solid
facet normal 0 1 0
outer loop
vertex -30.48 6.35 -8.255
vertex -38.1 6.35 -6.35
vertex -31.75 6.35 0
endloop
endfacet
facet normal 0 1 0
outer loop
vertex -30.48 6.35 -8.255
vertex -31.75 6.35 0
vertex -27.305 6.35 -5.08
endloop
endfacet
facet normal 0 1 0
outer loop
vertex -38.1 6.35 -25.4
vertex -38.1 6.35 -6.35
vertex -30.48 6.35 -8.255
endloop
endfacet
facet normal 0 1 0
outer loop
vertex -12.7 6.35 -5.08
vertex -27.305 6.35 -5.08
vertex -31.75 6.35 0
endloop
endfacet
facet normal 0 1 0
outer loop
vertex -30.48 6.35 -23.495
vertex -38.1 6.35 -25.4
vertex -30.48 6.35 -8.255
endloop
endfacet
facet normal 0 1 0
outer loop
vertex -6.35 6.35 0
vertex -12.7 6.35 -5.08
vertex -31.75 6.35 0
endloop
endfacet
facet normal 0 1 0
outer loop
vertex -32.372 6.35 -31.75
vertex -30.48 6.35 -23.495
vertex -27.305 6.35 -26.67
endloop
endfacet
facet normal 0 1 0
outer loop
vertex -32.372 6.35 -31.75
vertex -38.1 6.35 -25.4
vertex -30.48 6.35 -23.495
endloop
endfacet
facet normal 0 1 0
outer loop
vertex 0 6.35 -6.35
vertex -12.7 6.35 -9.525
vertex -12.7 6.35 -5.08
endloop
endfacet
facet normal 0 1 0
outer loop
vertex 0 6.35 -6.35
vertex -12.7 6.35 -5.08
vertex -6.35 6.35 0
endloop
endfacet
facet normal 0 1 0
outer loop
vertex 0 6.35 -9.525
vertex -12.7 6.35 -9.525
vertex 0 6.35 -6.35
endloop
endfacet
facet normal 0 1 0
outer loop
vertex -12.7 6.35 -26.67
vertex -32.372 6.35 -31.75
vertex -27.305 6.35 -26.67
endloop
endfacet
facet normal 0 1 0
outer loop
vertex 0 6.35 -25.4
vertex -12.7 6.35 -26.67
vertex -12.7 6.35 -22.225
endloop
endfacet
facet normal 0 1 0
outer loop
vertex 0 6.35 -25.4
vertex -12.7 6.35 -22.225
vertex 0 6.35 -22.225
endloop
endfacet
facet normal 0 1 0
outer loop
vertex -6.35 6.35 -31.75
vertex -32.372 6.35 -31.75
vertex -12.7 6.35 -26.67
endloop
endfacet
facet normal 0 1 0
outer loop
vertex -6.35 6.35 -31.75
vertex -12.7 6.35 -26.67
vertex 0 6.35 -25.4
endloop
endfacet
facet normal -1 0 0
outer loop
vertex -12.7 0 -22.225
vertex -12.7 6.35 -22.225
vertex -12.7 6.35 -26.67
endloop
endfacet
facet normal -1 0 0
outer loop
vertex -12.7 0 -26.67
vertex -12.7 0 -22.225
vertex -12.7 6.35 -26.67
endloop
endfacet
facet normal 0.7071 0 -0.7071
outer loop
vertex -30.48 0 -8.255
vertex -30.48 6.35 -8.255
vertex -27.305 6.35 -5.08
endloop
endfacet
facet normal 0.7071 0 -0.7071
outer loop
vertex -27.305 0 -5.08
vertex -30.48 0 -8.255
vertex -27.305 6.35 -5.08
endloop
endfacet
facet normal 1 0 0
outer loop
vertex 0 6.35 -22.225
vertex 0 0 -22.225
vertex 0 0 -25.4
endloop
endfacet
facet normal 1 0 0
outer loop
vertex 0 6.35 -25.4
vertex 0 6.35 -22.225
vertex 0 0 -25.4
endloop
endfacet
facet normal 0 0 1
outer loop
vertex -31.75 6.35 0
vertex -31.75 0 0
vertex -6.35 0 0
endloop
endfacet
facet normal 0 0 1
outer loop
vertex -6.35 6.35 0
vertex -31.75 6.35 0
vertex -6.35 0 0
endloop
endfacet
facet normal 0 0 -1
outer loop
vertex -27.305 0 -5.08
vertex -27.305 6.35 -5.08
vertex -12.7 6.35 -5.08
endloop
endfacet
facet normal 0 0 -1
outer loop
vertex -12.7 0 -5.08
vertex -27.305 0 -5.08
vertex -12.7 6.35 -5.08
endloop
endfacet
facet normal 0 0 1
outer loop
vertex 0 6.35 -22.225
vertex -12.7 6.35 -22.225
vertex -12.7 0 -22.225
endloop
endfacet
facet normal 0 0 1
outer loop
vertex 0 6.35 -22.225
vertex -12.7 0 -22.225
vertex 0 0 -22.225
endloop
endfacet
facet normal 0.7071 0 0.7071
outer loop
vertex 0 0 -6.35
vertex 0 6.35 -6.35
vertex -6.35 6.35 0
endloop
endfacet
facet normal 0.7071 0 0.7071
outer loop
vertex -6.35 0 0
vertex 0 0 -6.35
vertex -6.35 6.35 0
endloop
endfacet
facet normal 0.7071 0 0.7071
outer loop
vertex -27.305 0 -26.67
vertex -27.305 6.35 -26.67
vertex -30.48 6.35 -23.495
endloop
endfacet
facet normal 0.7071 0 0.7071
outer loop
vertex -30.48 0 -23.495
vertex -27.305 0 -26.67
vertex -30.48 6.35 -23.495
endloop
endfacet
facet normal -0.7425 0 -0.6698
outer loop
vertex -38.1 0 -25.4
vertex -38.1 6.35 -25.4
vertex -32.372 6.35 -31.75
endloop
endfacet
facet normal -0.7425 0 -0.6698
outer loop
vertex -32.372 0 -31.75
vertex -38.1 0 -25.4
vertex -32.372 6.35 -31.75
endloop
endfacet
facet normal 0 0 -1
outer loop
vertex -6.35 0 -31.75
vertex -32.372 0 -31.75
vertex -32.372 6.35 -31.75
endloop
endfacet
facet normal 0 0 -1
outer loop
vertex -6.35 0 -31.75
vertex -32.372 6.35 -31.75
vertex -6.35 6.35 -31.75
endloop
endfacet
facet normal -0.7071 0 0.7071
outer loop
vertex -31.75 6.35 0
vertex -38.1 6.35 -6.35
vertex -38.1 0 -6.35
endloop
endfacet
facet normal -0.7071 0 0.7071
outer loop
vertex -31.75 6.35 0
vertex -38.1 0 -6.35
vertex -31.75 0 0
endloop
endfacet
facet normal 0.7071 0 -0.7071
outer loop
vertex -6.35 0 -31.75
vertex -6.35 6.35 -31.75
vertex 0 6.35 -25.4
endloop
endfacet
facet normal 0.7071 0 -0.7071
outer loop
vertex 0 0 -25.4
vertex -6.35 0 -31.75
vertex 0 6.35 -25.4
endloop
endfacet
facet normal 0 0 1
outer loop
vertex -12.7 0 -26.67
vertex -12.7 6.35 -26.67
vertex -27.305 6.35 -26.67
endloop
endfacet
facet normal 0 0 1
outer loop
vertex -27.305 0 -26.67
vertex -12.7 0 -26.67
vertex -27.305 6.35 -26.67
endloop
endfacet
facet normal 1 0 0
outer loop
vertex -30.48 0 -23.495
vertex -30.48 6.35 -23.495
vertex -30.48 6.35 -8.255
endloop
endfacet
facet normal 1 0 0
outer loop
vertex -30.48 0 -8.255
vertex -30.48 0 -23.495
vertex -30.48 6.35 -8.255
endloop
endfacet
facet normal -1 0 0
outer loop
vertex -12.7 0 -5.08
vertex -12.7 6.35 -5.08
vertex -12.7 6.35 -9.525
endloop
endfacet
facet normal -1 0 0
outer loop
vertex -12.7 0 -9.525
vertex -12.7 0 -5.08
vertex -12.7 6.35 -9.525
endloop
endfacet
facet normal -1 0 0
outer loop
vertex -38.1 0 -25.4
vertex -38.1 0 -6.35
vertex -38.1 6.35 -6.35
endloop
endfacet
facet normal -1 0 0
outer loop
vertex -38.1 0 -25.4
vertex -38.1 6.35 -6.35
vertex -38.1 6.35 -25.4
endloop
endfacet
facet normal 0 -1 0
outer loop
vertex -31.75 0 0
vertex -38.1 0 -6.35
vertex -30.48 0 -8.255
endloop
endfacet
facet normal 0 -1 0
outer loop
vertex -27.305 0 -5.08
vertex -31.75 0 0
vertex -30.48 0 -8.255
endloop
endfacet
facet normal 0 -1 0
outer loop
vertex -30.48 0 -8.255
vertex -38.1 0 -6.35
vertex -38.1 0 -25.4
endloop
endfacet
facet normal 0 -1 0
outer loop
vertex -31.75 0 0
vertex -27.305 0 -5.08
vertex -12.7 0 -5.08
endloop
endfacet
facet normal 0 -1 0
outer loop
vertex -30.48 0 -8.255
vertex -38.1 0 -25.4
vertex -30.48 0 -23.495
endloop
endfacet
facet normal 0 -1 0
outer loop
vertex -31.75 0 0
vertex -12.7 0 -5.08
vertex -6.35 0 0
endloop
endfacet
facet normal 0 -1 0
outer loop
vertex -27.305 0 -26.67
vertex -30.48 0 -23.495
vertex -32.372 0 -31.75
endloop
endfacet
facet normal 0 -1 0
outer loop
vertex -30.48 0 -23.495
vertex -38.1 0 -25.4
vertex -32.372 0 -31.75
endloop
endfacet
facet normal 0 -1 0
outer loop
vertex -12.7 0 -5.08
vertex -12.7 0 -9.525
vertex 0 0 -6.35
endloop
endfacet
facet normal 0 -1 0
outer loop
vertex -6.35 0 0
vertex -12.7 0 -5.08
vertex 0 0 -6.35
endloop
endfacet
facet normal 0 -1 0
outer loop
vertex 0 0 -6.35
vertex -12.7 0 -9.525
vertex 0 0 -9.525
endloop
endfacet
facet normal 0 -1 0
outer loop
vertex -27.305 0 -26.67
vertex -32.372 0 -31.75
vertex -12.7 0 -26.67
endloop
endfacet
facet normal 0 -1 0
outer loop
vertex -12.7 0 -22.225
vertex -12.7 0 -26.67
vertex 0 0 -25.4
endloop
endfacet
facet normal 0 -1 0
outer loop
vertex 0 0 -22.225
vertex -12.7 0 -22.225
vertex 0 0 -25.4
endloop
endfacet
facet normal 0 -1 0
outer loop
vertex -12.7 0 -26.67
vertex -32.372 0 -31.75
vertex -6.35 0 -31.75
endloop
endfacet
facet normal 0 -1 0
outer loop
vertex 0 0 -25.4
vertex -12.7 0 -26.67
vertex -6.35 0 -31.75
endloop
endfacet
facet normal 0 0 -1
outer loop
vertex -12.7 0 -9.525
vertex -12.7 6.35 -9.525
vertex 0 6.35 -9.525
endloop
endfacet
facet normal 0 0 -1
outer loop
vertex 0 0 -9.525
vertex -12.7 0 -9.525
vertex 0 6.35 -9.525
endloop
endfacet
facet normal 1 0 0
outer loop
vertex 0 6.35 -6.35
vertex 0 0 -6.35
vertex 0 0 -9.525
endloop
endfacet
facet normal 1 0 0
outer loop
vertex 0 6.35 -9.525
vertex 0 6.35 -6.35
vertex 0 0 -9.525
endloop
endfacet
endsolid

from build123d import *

# Parameters (mm, degrees)
SKETCH1_W           = 38.1
SKETCH1_H           = 31.75
BOSS_EXTRUDE1_DEPTH = 6.35
SKETCH2_W           = 12.7
SKETCH2_H           = 12.7
CUT_EXTRUDE1_DEPTH  = 50.99995


with BuildPart() as part:
    # Sketch1 → Boss-Extrude1 (new body)
    with BuildSketch(Plane(origin=(0, 0, 0), x_dir=(1, 0, 0), z_dir=(0, 1, 0))):
        with Locations((-19.05, 15.875)):
            Rectangle(SKETCH1_W, SKETCH1_H)
    extrude(amount=BOSS_EXTRUDE1_DEPTH)

    # Sketch2 → Cut-Extrude1 (cut, through all)
    with BuildSketch(Plane(origin=(0, 6.35, 0), x_dir=(1, 0, 0), z_dir=(0, 1, 0))):
        Polygon((-12.7, 26.67), (-27.305, 26.67), (-30.48, 23.495), (-30.48, 8.255), (-27.305, 5.08), (-12.7, 5.08), (-12.7, 9.525), (-12.7, 22.225), align=None)
        with Locations((-6.35, 15.875)):
            Rectangle(SKETCH2_W, SKETCH2_H)
        Polygon((0, 0), (0, 6.35), (-6.35, 0), align=None)
        Polygon((0, 31.75), (-6.35, 31.75), (0, 25.4), align=None)
        Polygon((-38.1, 6.35), (-31.75, 0), (-38.1, 0), align=None)
        Polygon((-38.1, 31.75), (-38.1, 25.4), (-32.371620034, 31.75), align=None)
    extrude(amount=-CUT_EXTRUDE1_DEPTH, mode=Mode.SUBTRACT)


solid = part.part
